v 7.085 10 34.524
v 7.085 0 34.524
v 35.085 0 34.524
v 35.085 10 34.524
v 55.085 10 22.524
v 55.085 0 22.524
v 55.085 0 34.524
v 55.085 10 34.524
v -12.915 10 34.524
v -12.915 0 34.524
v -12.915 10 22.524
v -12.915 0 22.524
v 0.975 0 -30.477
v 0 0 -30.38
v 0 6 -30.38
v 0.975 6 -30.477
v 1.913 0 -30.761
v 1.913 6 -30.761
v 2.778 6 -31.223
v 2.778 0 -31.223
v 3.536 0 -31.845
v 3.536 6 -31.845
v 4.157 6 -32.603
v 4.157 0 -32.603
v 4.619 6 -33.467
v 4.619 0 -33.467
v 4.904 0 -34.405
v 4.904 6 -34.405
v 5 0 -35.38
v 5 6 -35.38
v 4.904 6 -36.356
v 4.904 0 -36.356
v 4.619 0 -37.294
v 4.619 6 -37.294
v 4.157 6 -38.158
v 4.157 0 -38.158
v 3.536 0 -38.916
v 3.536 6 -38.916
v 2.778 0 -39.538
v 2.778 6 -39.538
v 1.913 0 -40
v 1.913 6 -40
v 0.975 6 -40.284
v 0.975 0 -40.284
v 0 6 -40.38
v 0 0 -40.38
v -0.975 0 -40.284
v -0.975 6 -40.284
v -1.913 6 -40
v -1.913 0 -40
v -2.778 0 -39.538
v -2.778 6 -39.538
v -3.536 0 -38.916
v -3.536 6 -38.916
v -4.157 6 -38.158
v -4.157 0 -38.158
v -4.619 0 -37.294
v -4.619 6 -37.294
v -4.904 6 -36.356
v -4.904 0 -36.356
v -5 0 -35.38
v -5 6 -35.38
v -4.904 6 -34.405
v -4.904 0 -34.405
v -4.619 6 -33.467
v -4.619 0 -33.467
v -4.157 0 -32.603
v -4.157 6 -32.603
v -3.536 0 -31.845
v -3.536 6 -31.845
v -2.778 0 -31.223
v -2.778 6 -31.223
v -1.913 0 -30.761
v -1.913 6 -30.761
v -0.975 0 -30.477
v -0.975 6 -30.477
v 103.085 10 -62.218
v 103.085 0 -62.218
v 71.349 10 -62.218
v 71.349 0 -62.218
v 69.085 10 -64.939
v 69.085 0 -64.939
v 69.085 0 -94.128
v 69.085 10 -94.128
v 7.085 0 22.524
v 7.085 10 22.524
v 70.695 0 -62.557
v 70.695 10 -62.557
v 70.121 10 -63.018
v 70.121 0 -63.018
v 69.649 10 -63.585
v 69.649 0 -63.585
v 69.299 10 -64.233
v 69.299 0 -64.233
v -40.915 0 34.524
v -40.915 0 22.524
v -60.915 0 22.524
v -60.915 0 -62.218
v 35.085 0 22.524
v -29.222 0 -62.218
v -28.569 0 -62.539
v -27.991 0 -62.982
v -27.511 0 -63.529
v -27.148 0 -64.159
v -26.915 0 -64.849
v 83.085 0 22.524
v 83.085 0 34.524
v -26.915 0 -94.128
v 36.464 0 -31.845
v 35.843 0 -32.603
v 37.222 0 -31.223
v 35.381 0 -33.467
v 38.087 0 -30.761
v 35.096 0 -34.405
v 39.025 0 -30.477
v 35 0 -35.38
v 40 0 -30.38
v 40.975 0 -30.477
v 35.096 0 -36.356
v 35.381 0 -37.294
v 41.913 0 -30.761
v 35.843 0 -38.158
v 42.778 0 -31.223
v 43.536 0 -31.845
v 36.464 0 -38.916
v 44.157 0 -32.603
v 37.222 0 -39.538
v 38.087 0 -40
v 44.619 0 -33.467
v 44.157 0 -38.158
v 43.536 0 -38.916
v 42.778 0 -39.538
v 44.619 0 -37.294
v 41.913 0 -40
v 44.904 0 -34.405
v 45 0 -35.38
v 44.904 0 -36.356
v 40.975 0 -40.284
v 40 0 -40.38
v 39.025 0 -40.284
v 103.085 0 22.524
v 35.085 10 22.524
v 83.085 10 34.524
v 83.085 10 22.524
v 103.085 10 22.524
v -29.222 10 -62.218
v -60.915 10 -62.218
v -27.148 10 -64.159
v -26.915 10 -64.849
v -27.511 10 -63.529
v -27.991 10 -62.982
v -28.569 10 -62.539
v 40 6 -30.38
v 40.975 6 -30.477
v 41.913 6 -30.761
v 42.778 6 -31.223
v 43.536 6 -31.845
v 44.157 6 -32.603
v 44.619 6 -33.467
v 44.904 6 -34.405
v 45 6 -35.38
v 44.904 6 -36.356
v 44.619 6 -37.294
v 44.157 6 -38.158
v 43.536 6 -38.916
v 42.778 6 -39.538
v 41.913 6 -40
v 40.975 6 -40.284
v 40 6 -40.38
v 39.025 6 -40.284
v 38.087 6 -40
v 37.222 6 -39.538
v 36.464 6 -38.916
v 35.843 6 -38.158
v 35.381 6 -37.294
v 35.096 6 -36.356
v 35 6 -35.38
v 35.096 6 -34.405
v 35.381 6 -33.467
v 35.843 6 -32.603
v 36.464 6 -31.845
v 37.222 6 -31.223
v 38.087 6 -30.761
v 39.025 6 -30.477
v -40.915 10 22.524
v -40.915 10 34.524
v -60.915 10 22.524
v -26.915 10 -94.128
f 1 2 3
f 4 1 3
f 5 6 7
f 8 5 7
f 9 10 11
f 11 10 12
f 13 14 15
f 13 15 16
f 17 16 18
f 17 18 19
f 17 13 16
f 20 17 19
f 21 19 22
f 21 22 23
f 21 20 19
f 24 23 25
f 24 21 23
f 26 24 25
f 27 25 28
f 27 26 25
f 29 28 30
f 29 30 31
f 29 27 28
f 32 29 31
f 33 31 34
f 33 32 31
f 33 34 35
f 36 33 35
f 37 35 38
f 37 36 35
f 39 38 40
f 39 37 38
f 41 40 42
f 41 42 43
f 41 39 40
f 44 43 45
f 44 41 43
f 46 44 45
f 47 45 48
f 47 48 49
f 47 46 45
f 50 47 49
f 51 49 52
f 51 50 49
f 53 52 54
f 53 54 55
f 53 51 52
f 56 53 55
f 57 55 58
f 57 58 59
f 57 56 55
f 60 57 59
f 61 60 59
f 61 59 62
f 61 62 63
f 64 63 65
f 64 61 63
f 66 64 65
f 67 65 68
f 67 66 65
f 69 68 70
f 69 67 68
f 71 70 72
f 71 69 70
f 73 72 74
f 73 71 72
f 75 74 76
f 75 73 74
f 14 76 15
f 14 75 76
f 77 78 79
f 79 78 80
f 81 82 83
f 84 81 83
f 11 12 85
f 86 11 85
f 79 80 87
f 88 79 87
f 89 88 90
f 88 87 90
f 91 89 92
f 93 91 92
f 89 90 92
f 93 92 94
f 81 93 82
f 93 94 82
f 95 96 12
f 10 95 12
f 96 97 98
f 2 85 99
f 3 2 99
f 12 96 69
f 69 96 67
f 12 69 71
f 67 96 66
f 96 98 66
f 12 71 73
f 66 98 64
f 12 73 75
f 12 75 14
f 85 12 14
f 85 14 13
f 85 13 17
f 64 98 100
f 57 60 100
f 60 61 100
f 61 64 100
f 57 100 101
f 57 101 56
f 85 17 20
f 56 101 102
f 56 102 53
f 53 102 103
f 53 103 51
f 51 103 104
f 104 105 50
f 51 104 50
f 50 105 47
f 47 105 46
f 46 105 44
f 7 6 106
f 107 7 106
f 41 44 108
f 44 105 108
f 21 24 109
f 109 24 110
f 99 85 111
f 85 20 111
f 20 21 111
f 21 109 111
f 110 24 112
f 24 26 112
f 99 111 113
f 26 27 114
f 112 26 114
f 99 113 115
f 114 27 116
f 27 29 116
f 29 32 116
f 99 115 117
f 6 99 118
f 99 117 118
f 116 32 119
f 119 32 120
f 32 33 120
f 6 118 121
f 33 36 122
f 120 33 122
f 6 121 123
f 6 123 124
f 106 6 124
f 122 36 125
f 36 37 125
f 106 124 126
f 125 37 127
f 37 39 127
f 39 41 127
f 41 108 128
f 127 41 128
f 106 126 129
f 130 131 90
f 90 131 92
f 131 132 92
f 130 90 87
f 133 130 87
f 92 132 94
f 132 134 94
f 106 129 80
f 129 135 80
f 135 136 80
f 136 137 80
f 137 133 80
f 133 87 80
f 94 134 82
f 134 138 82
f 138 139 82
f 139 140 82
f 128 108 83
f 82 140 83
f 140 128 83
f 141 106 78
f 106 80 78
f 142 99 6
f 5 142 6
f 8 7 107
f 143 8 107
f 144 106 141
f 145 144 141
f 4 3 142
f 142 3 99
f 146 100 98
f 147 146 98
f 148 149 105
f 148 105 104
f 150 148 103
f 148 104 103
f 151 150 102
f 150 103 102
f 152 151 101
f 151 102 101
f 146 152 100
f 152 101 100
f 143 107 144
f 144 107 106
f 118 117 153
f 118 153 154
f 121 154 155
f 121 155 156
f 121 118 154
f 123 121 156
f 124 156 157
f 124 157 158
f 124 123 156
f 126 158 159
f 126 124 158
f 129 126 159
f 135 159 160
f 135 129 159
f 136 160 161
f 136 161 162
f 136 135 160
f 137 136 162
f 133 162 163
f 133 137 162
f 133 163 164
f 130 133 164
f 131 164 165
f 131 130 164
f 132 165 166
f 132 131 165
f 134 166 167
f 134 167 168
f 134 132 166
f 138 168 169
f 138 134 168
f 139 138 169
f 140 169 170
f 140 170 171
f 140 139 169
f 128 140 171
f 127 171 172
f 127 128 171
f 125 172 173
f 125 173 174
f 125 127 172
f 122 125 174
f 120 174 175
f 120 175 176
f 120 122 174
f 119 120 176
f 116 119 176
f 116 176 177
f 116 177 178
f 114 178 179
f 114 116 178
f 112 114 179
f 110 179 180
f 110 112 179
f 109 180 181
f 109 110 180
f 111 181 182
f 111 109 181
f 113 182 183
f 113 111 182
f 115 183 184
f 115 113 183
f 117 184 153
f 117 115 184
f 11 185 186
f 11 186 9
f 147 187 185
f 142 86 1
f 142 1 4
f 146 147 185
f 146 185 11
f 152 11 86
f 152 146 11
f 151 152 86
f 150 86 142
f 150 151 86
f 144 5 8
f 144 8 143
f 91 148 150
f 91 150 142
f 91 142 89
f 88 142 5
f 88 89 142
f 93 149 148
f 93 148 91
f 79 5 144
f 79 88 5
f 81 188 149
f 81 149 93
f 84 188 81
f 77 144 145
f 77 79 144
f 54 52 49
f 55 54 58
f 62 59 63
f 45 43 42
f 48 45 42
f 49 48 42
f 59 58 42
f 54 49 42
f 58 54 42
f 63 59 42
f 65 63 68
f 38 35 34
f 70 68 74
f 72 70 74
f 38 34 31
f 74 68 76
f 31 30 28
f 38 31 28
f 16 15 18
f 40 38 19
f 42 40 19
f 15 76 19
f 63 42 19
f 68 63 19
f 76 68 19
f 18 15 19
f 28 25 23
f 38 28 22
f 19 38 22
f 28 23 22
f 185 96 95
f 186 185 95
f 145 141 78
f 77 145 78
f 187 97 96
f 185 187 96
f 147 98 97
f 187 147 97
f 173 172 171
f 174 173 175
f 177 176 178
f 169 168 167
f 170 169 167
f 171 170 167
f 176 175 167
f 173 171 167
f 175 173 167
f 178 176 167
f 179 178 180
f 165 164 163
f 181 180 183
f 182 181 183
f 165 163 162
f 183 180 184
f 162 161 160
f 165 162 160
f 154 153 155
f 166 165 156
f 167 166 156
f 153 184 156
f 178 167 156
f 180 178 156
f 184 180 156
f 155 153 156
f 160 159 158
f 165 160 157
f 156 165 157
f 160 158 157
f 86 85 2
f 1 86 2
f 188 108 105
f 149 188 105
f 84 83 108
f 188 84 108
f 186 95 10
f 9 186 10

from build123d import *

# Parameters (mm, degrees)
SALIENTE_EXTRUIR1_DEPTH = 10
CROQUIS1_10_R           = 5
CORTAR_EXTRUIR1_DEPTH   = 6


with BuildPart() as part:
    # Croquis1 → Saliente-Extruir1 (new body)
    with BuildSketch(Plane(origin=(0, 0, 0), x_dir=(1, 0, 0), z_dir=(0, 1, 0))):
        with BuildLine():
            Line((-60.914821384, -22.524031449), (-40.914821384, -22.524031449))
            Line((-40.914821384, -22.524031449), (-40.914821384, -34.524031449))
            Line((-40.914821384, -34.524031449), (-12.914821384, -34.524031449))
            Line((-12.914821384, -34.524031449), (-12.914821384, -22.524031449))
            Line((-12.914821384, -22.524031449), (7.085178616, -22.524031449))
            Line((7.085178616, -22.524031449), (7.085178616, -34.524031449))
            Line((7.085178616, -34.524031449), (35.085178616, -34.524031449))
            Line((35.085178616, -34.524031449), (35.085178616, -22.524031449))
            Line((35.085178616, -22.524031449), (55.085178616, -22.524031449))
            Line((55.085178616, -22.524031449), (55.085178616, -34.524031449))
            Line((55.085178616, -34.524031449), (83.085178616, -34.524031449))
            Line((83.085178616, -34.524031449), (83.085178616, -22.524031449))
            Line((83.085178616, -22.524031449), (103.085178616, -22.524031449))
            Line((103.085178616, -22.524031449), (103.085178616, 62.217775428))
            Line((103.085178616, 62.217775428), (71.349410248, 62.217775428))
            ThreePointArc((71.349410248, 62.217775428), (69.870831169, 63.28983211), (69.085178616, 64.938544239))
            Line((69.085178616, 64.938544239), (69.085178616, 94.127666629))
            Line((69.085178616, 94.127666629), (-26.914821384, 94.127666629))
            Line((-26.914821384, 94.127666629), (-26.914821384, 64.848788639))
            ThreePointArc((-26.914821384, 64.848788639), (-27.737578388, 63.243349526), (-29.221681351, 62.217775428))
            Line((-29.221681351, 62.217775428), (-60.914821384, 62.217775428))
            Line((-60.914821384, 62.217775428), (-60.914821384, -22.524031449))
        make_face()
    extrude(amount=SALIENTE_EXTRUIR1_DEPTH)

    # Croquis1<10> → Cortar-Extruir1 (cut)
    with BuildSketch(Plane(origin=(0, 0, 0), x_dir=(1, 0, 0), z_dir=(0, 1, 0))):
        with Locations((0, 35.380497461)):
            Circle(CROQUIS1_10_R)
        with Locations((40, 35.380497461)):
            Circle(CROQUIS1_10_R)
    extrude(amount=CORTAR_EXTRUIR1_DEPTH, mode=Mode.SUBTRACT)


solid = part.part
